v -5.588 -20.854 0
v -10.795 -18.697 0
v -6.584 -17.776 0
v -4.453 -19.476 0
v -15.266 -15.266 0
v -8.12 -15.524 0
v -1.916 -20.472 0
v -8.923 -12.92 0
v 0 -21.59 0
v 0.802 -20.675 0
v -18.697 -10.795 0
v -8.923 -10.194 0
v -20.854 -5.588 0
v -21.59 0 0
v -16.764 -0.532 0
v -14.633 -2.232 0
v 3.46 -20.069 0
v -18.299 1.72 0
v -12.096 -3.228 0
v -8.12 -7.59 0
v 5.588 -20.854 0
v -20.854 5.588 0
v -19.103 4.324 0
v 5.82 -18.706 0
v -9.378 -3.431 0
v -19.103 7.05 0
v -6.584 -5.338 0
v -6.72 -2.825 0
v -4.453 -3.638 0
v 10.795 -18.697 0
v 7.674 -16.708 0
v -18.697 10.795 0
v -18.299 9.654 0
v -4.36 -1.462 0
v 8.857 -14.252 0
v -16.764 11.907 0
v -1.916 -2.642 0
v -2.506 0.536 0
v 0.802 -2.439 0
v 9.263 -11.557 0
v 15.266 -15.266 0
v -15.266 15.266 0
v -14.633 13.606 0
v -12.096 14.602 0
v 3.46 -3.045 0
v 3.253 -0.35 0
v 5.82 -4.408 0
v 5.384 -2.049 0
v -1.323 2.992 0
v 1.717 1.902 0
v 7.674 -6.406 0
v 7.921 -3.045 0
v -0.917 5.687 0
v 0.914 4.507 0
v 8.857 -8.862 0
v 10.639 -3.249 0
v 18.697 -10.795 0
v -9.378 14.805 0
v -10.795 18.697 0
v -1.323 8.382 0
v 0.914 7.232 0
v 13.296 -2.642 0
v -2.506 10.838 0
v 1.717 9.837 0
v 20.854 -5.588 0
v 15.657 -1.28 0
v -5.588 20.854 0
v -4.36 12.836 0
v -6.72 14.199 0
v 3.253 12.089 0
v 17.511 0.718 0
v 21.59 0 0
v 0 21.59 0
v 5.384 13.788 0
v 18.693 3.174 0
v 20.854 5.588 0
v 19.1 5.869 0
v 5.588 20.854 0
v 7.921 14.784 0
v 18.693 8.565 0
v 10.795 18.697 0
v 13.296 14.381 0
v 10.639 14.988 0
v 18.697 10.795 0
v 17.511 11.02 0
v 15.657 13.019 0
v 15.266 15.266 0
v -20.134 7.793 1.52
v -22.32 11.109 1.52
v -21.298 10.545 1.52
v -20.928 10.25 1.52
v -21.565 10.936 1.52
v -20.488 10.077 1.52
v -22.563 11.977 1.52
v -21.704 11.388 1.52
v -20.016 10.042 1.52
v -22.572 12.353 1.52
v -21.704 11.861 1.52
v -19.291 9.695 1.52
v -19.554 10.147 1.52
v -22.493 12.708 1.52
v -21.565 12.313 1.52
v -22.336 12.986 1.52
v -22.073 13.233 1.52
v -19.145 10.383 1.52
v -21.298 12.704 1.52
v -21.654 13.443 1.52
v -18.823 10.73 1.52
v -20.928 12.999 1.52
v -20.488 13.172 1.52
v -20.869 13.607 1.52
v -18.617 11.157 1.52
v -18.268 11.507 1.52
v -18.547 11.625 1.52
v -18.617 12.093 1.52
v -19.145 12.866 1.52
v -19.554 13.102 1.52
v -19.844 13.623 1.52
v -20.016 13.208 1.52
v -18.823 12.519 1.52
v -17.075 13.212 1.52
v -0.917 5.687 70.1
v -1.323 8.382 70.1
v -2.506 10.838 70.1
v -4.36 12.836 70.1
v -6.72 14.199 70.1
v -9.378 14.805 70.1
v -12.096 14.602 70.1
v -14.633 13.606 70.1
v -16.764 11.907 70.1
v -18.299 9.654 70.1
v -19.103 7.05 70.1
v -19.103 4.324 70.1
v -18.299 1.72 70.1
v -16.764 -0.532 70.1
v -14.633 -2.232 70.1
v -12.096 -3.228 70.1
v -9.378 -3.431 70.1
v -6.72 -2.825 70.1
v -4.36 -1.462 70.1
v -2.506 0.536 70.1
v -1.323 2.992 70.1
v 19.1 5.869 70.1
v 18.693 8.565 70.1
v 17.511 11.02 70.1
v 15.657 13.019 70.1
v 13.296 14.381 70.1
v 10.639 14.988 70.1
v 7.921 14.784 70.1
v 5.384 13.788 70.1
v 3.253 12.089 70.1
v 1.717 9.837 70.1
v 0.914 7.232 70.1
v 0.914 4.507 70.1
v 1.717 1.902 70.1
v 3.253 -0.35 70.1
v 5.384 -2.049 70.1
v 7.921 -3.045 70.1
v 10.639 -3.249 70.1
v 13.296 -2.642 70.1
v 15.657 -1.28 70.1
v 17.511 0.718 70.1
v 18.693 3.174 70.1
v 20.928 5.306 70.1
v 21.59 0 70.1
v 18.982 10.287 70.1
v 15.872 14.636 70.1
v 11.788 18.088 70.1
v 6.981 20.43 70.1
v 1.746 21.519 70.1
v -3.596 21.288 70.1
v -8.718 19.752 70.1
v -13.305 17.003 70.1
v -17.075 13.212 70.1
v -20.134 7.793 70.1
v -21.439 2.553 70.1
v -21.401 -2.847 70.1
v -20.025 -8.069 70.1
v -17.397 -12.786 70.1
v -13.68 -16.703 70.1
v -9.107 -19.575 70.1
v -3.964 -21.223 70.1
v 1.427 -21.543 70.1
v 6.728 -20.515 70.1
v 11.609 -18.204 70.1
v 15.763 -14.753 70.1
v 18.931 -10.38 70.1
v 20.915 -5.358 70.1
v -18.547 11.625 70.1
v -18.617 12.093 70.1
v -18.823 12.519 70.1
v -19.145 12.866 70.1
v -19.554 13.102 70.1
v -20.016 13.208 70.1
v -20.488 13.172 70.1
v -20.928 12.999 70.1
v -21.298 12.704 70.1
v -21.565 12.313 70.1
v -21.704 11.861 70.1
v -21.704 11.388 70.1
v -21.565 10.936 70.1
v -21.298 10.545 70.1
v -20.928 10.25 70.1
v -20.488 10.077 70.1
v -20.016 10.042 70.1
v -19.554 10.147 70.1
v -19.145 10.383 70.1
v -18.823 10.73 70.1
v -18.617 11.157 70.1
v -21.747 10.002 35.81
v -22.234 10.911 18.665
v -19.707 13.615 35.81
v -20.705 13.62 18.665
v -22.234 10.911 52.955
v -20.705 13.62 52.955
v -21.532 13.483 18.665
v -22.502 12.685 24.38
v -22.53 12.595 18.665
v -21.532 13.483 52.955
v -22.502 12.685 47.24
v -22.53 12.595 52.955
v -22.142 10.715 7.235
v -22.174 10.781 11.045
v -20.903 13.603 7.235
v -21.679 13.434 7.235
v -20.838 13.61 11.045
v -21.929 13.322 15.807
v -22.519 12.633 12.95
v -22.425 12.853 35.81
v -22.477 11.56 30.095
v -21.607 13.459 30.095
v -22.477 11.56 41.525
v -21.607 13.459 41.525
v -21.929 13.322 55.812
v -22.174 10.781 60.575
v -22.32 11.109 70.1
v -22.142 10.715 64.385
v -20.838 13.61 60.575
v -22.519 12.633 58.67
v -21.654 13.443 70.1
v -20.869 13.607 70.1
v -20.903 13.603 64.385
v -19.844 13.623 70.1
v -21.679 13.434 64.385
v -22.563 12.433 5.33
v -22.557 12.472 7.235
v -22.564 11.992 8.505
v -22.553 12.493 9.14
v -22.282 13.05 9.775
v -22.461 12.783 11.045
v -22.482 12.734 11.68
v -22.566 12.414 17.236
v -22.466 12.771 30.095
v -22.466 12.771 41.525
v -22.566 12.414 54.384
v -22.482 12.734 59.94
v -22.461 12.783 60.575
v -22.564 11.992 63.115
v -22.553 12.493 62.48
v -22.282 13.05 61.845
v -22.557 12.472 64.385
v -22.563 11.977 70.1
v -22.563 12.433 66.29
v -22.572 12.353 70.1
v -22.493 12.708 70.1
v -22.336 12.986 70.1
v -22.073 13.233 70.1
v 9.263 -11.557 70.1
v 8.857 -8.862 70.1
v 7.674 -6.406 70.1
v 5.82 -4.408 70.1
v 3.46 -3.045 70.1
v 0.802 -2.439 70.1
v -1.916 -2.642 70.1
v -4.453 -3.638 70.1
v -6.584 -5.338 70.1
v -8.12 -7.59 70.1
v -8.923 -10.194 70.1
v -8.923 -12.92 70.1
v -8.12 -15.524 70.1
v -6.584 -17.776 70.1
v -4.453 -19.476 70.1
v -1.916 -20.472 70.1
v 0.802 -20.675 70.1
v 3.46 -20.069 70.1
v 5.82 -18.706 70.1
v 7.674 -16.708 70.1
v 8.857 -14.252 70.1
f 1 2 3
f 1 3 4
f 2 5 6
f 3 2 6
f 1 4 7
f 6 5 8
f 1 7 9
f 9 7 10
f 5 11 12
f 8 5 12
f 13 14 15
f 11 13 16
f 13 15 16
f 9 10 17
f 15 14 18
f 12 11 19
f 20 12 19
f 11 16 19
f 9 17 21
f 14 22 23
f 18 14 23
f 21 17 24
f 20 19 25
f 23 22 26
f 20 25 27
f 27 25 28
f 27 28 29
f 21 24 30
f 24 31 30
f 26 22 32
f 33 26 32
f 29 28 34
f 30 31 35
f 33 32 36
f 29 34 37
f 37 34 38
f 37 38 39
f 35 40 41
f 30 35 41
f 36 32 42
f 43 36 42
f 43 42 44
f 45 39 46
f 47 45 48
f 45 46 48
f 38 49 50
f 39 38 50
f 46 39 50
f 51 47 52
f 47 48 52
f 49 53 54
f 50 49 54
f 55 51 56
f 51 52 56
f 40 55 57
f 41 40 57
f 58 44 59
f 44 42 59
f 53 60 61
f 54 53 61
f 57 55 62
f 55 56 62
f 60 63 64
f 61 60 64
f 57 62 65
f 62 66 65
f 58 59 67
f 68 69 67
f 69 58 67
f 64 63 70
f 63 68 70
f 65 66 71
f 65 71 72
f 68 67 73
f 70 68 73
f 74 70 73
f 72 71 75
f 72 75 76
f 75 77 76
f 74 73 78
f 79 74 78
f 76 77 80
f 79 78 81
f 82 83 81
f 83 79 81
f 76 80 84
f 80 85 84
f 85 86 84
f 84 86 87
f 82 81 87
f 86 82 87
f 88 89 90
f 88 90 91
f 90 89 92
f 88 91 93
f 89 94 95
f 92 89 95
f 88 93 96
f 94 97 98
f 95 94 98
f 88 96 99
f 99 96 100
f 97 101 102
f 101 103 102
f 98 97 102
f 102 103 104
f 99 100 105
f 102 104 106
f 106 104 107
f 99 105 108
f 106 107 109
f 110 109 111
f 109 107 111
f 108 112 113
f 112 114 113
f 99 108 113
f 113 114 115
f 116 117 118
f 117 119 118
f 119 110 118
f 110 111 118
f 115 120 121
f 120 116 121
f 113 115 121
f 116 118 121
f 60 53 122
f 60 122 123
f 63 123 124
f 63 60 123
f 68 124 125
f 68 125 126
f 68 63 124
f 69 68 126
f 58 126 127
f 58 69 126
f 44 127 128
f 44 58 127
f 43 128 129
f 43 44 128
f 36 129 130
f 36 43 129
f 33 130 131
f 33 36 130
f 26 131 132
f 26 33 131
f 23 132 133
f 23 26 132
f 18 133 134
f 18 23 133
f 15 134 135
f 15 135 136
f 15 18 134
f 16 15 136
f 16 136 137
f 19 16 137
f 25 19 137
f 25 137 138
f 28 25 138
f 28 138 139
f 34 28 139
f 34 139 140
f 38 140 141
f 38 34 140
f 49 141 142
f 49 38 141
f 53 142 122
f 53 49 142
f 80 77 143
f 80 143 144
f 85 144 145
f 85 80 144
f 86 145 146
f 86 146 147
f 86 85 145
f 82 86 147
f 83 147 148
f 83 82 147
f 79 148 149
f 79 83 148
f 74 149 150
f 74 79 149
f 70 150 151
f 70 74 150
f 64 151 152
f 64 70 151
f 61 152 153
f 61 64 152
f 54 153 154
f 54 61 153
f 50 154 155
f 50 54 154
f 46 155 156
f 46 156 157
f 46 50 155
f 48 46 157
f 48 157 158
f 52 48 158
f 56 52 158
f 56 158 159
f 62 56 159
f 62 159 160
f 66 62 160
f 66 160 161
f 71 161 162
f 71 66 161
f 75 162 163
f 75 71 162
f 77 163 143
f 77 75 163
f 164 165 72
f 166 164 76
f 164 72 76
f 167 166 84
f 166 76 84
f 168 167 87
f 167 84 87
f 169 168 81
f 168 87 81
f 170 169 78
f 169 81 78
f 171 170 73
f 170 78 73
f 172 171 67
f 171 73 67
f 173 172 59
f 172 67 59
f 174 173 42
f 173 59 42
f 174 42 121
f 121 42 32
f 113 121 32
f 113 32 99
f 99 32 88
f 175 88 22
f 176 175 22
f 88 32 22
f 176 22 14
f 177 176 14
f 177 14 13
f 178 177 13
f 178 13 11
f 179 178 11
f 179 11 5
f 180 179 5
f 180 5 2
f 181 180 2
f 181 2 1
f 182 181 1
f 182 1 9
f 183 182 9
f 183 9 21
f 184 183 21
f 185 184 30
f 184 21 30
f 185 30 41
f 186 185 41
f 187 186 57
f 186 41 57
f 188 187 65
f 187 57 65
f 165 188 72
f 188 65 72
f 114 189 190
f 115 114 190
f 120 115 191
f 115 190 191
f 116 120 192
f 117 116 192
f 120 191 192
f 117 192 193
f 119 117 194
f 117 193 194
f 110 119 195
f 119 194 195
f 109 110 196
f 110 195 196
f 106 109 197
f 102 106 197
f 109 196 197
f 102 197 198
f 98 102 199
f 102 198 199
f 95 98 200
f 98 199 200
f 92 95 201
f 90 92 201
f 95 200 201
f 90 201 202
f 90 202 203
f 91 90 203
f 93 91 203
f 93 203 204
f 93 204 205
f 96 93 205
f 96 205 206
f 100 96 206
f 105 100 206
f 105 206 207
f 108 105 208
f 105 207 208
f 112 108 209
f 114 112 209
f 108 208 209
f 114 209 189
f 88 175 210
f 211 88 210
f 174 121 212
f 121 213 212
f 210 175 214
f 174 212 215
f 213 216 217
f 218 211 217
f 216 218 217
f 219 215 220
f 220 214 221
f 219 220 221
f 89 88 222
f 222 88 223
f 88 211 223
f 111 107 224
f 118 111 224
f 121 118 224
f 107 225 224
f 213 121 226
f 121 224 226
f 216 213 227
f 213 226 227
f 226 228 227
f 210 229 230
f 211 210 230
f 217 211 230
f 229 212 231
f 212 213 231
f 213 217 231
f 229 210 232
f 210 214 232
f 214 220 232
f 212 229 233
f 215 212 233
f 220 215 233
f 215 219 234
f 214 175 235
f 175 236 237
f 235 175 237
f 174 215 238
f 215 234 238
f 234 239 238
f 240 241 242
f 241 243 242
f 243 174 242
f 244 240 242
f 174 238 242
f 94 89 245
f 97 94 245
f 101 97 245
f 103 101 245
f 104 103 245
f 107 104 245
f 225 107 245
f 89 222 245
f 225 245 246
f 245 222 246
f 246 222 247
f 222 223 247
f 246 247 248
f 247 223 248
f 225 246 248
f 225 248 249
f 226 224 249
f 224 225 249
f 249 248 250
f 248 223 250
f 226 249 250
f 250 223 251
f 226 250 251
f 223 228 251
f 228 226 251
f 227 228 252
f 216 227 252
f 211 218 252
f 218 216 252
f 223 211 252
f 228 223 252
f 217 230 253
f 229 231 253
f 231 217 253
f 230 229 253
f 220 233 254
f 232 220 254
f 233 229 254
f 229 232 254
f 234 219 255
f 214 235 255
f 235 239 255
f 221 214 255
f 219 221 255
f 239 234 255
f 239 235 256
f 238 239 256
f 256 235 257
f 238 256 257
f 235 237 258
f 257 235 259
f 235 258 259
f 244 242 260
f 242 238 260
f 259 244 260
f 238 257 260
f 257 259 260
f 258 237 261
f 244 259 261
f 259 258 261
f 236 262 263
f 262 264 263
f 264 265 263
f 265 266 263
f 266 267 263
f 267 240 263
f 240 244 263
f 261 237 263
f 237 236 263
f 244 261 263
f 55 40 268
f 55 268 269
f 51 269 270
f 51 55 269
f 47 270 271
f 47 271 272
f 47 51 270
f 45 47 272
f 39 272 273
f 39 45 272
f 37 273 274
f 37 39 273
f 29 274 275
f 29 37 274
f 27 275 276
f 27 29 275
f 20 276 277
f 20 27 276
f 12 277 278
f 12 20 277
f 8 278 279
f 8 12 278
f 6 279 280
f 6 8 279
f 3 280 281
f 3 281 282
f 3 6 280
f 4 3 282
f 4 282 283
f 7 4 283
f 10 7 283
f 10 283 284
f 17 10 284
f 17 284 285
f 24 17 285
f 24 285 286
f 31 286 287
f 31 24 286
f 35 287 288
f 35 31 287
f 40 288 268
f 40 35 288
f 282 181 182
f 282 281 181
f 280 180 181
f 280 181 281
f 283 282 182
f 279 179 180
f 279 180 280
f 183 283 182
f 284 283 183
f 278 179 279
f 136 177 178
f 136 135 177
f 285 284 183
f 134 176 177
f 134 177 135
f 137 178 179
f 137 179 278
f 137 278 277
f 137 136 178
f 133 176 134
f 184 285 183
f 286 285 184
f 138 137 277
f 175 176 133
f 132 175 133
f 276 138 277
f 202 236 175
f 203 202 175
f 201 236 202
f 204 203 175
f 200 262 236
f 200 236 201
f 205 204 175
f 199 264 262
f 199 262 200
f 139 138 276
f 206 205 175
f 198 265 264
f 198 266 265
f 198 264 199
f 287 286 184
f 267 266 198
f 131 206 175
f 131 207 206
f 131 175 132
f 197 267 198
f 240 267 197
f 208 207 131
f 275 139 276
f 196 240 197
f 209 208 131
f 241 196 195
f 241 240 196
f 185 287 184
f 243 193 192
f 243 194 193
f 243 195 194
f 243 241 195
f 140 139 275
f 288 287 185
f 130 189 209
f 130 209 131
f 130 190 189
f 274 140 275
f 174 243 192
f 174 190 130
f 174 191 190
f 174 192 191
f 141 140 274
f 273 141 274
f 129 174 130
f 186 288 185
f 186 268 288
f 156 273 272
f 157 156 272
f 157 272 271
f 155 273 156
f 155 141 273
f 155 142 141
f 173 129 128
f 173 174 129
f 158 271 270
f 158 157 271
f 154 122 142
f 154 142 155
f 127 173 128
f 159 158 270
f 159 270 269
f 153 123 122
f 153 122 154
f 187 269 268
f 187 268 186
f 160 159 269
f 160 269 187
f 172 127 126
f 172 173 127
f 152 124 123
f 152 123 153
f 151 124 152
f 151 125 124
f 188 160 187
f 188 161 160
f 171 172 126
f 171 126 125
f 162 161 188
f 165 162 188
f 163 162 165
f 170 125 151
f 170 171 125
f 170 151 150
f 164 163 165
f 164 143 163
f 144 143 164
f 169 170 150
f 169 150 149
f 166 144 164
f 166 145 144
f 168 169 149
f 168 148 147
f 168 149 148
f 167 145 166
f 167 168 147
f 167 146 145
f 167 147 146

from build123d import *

# Parameters (mm, degrees)
SKETCH1_R           = 21.59
SKETCH1_R_2         = 9.144
BOSS_EXTRUDE1_DEPTH = 70.1
SKETCH2_R           = 1.5875
BOSS_EXTRUDE3_DEPTH = 68.58


with BuildPart() as part:
    # Sketch1 → Boss-Extrude1 (new body)
    with BuildSketch(Plane.XY):
        Circle(SKETCH1_R)
        with Locations((0.118855304, -11.557)):
            Circle(SKETCH1_R_2, mode=Mode.SUBTRACT)
        with Locations((9.955579479, 5.869470694)):
            Circle(SKETCH1_R_2, mode=Mode.SUBTRACT)
        with Locations((-10.060900468, 5.687049391)):
            Circle(SKETCH1_R_2, mode=Mode.SUBTRACT)
    extrude(amount=BOSS_EXTRUDE1_DEPTH)

    # Sketch2 → Boss-Extrude3 (add)
    with BuildSketch(Plane.XY.offset(70.1)):
        with BuildLine():
            ThreePointArc((-20.134392286, 7.793224446), (-18.801139076, 10.613447577), (-17.075379878, 13.212096806))
            add(Edge.make_bspline(
                [(-20.134392286, 7.793224446), (-26.24429958, 15.203378156), (-17.075379878, 13.212096806)],
                knots=[0, 0, 0, 1, 1, 1], degree=2))
        make_face()
        with Locations((-20.134392286, 11.624596806)):
            Circle(SKETCH2_R, mode=Mode.SUBTRACT)
    extrude(amount=-BOSS_EXTRUDE3_DEPTH)


solid = part.part
